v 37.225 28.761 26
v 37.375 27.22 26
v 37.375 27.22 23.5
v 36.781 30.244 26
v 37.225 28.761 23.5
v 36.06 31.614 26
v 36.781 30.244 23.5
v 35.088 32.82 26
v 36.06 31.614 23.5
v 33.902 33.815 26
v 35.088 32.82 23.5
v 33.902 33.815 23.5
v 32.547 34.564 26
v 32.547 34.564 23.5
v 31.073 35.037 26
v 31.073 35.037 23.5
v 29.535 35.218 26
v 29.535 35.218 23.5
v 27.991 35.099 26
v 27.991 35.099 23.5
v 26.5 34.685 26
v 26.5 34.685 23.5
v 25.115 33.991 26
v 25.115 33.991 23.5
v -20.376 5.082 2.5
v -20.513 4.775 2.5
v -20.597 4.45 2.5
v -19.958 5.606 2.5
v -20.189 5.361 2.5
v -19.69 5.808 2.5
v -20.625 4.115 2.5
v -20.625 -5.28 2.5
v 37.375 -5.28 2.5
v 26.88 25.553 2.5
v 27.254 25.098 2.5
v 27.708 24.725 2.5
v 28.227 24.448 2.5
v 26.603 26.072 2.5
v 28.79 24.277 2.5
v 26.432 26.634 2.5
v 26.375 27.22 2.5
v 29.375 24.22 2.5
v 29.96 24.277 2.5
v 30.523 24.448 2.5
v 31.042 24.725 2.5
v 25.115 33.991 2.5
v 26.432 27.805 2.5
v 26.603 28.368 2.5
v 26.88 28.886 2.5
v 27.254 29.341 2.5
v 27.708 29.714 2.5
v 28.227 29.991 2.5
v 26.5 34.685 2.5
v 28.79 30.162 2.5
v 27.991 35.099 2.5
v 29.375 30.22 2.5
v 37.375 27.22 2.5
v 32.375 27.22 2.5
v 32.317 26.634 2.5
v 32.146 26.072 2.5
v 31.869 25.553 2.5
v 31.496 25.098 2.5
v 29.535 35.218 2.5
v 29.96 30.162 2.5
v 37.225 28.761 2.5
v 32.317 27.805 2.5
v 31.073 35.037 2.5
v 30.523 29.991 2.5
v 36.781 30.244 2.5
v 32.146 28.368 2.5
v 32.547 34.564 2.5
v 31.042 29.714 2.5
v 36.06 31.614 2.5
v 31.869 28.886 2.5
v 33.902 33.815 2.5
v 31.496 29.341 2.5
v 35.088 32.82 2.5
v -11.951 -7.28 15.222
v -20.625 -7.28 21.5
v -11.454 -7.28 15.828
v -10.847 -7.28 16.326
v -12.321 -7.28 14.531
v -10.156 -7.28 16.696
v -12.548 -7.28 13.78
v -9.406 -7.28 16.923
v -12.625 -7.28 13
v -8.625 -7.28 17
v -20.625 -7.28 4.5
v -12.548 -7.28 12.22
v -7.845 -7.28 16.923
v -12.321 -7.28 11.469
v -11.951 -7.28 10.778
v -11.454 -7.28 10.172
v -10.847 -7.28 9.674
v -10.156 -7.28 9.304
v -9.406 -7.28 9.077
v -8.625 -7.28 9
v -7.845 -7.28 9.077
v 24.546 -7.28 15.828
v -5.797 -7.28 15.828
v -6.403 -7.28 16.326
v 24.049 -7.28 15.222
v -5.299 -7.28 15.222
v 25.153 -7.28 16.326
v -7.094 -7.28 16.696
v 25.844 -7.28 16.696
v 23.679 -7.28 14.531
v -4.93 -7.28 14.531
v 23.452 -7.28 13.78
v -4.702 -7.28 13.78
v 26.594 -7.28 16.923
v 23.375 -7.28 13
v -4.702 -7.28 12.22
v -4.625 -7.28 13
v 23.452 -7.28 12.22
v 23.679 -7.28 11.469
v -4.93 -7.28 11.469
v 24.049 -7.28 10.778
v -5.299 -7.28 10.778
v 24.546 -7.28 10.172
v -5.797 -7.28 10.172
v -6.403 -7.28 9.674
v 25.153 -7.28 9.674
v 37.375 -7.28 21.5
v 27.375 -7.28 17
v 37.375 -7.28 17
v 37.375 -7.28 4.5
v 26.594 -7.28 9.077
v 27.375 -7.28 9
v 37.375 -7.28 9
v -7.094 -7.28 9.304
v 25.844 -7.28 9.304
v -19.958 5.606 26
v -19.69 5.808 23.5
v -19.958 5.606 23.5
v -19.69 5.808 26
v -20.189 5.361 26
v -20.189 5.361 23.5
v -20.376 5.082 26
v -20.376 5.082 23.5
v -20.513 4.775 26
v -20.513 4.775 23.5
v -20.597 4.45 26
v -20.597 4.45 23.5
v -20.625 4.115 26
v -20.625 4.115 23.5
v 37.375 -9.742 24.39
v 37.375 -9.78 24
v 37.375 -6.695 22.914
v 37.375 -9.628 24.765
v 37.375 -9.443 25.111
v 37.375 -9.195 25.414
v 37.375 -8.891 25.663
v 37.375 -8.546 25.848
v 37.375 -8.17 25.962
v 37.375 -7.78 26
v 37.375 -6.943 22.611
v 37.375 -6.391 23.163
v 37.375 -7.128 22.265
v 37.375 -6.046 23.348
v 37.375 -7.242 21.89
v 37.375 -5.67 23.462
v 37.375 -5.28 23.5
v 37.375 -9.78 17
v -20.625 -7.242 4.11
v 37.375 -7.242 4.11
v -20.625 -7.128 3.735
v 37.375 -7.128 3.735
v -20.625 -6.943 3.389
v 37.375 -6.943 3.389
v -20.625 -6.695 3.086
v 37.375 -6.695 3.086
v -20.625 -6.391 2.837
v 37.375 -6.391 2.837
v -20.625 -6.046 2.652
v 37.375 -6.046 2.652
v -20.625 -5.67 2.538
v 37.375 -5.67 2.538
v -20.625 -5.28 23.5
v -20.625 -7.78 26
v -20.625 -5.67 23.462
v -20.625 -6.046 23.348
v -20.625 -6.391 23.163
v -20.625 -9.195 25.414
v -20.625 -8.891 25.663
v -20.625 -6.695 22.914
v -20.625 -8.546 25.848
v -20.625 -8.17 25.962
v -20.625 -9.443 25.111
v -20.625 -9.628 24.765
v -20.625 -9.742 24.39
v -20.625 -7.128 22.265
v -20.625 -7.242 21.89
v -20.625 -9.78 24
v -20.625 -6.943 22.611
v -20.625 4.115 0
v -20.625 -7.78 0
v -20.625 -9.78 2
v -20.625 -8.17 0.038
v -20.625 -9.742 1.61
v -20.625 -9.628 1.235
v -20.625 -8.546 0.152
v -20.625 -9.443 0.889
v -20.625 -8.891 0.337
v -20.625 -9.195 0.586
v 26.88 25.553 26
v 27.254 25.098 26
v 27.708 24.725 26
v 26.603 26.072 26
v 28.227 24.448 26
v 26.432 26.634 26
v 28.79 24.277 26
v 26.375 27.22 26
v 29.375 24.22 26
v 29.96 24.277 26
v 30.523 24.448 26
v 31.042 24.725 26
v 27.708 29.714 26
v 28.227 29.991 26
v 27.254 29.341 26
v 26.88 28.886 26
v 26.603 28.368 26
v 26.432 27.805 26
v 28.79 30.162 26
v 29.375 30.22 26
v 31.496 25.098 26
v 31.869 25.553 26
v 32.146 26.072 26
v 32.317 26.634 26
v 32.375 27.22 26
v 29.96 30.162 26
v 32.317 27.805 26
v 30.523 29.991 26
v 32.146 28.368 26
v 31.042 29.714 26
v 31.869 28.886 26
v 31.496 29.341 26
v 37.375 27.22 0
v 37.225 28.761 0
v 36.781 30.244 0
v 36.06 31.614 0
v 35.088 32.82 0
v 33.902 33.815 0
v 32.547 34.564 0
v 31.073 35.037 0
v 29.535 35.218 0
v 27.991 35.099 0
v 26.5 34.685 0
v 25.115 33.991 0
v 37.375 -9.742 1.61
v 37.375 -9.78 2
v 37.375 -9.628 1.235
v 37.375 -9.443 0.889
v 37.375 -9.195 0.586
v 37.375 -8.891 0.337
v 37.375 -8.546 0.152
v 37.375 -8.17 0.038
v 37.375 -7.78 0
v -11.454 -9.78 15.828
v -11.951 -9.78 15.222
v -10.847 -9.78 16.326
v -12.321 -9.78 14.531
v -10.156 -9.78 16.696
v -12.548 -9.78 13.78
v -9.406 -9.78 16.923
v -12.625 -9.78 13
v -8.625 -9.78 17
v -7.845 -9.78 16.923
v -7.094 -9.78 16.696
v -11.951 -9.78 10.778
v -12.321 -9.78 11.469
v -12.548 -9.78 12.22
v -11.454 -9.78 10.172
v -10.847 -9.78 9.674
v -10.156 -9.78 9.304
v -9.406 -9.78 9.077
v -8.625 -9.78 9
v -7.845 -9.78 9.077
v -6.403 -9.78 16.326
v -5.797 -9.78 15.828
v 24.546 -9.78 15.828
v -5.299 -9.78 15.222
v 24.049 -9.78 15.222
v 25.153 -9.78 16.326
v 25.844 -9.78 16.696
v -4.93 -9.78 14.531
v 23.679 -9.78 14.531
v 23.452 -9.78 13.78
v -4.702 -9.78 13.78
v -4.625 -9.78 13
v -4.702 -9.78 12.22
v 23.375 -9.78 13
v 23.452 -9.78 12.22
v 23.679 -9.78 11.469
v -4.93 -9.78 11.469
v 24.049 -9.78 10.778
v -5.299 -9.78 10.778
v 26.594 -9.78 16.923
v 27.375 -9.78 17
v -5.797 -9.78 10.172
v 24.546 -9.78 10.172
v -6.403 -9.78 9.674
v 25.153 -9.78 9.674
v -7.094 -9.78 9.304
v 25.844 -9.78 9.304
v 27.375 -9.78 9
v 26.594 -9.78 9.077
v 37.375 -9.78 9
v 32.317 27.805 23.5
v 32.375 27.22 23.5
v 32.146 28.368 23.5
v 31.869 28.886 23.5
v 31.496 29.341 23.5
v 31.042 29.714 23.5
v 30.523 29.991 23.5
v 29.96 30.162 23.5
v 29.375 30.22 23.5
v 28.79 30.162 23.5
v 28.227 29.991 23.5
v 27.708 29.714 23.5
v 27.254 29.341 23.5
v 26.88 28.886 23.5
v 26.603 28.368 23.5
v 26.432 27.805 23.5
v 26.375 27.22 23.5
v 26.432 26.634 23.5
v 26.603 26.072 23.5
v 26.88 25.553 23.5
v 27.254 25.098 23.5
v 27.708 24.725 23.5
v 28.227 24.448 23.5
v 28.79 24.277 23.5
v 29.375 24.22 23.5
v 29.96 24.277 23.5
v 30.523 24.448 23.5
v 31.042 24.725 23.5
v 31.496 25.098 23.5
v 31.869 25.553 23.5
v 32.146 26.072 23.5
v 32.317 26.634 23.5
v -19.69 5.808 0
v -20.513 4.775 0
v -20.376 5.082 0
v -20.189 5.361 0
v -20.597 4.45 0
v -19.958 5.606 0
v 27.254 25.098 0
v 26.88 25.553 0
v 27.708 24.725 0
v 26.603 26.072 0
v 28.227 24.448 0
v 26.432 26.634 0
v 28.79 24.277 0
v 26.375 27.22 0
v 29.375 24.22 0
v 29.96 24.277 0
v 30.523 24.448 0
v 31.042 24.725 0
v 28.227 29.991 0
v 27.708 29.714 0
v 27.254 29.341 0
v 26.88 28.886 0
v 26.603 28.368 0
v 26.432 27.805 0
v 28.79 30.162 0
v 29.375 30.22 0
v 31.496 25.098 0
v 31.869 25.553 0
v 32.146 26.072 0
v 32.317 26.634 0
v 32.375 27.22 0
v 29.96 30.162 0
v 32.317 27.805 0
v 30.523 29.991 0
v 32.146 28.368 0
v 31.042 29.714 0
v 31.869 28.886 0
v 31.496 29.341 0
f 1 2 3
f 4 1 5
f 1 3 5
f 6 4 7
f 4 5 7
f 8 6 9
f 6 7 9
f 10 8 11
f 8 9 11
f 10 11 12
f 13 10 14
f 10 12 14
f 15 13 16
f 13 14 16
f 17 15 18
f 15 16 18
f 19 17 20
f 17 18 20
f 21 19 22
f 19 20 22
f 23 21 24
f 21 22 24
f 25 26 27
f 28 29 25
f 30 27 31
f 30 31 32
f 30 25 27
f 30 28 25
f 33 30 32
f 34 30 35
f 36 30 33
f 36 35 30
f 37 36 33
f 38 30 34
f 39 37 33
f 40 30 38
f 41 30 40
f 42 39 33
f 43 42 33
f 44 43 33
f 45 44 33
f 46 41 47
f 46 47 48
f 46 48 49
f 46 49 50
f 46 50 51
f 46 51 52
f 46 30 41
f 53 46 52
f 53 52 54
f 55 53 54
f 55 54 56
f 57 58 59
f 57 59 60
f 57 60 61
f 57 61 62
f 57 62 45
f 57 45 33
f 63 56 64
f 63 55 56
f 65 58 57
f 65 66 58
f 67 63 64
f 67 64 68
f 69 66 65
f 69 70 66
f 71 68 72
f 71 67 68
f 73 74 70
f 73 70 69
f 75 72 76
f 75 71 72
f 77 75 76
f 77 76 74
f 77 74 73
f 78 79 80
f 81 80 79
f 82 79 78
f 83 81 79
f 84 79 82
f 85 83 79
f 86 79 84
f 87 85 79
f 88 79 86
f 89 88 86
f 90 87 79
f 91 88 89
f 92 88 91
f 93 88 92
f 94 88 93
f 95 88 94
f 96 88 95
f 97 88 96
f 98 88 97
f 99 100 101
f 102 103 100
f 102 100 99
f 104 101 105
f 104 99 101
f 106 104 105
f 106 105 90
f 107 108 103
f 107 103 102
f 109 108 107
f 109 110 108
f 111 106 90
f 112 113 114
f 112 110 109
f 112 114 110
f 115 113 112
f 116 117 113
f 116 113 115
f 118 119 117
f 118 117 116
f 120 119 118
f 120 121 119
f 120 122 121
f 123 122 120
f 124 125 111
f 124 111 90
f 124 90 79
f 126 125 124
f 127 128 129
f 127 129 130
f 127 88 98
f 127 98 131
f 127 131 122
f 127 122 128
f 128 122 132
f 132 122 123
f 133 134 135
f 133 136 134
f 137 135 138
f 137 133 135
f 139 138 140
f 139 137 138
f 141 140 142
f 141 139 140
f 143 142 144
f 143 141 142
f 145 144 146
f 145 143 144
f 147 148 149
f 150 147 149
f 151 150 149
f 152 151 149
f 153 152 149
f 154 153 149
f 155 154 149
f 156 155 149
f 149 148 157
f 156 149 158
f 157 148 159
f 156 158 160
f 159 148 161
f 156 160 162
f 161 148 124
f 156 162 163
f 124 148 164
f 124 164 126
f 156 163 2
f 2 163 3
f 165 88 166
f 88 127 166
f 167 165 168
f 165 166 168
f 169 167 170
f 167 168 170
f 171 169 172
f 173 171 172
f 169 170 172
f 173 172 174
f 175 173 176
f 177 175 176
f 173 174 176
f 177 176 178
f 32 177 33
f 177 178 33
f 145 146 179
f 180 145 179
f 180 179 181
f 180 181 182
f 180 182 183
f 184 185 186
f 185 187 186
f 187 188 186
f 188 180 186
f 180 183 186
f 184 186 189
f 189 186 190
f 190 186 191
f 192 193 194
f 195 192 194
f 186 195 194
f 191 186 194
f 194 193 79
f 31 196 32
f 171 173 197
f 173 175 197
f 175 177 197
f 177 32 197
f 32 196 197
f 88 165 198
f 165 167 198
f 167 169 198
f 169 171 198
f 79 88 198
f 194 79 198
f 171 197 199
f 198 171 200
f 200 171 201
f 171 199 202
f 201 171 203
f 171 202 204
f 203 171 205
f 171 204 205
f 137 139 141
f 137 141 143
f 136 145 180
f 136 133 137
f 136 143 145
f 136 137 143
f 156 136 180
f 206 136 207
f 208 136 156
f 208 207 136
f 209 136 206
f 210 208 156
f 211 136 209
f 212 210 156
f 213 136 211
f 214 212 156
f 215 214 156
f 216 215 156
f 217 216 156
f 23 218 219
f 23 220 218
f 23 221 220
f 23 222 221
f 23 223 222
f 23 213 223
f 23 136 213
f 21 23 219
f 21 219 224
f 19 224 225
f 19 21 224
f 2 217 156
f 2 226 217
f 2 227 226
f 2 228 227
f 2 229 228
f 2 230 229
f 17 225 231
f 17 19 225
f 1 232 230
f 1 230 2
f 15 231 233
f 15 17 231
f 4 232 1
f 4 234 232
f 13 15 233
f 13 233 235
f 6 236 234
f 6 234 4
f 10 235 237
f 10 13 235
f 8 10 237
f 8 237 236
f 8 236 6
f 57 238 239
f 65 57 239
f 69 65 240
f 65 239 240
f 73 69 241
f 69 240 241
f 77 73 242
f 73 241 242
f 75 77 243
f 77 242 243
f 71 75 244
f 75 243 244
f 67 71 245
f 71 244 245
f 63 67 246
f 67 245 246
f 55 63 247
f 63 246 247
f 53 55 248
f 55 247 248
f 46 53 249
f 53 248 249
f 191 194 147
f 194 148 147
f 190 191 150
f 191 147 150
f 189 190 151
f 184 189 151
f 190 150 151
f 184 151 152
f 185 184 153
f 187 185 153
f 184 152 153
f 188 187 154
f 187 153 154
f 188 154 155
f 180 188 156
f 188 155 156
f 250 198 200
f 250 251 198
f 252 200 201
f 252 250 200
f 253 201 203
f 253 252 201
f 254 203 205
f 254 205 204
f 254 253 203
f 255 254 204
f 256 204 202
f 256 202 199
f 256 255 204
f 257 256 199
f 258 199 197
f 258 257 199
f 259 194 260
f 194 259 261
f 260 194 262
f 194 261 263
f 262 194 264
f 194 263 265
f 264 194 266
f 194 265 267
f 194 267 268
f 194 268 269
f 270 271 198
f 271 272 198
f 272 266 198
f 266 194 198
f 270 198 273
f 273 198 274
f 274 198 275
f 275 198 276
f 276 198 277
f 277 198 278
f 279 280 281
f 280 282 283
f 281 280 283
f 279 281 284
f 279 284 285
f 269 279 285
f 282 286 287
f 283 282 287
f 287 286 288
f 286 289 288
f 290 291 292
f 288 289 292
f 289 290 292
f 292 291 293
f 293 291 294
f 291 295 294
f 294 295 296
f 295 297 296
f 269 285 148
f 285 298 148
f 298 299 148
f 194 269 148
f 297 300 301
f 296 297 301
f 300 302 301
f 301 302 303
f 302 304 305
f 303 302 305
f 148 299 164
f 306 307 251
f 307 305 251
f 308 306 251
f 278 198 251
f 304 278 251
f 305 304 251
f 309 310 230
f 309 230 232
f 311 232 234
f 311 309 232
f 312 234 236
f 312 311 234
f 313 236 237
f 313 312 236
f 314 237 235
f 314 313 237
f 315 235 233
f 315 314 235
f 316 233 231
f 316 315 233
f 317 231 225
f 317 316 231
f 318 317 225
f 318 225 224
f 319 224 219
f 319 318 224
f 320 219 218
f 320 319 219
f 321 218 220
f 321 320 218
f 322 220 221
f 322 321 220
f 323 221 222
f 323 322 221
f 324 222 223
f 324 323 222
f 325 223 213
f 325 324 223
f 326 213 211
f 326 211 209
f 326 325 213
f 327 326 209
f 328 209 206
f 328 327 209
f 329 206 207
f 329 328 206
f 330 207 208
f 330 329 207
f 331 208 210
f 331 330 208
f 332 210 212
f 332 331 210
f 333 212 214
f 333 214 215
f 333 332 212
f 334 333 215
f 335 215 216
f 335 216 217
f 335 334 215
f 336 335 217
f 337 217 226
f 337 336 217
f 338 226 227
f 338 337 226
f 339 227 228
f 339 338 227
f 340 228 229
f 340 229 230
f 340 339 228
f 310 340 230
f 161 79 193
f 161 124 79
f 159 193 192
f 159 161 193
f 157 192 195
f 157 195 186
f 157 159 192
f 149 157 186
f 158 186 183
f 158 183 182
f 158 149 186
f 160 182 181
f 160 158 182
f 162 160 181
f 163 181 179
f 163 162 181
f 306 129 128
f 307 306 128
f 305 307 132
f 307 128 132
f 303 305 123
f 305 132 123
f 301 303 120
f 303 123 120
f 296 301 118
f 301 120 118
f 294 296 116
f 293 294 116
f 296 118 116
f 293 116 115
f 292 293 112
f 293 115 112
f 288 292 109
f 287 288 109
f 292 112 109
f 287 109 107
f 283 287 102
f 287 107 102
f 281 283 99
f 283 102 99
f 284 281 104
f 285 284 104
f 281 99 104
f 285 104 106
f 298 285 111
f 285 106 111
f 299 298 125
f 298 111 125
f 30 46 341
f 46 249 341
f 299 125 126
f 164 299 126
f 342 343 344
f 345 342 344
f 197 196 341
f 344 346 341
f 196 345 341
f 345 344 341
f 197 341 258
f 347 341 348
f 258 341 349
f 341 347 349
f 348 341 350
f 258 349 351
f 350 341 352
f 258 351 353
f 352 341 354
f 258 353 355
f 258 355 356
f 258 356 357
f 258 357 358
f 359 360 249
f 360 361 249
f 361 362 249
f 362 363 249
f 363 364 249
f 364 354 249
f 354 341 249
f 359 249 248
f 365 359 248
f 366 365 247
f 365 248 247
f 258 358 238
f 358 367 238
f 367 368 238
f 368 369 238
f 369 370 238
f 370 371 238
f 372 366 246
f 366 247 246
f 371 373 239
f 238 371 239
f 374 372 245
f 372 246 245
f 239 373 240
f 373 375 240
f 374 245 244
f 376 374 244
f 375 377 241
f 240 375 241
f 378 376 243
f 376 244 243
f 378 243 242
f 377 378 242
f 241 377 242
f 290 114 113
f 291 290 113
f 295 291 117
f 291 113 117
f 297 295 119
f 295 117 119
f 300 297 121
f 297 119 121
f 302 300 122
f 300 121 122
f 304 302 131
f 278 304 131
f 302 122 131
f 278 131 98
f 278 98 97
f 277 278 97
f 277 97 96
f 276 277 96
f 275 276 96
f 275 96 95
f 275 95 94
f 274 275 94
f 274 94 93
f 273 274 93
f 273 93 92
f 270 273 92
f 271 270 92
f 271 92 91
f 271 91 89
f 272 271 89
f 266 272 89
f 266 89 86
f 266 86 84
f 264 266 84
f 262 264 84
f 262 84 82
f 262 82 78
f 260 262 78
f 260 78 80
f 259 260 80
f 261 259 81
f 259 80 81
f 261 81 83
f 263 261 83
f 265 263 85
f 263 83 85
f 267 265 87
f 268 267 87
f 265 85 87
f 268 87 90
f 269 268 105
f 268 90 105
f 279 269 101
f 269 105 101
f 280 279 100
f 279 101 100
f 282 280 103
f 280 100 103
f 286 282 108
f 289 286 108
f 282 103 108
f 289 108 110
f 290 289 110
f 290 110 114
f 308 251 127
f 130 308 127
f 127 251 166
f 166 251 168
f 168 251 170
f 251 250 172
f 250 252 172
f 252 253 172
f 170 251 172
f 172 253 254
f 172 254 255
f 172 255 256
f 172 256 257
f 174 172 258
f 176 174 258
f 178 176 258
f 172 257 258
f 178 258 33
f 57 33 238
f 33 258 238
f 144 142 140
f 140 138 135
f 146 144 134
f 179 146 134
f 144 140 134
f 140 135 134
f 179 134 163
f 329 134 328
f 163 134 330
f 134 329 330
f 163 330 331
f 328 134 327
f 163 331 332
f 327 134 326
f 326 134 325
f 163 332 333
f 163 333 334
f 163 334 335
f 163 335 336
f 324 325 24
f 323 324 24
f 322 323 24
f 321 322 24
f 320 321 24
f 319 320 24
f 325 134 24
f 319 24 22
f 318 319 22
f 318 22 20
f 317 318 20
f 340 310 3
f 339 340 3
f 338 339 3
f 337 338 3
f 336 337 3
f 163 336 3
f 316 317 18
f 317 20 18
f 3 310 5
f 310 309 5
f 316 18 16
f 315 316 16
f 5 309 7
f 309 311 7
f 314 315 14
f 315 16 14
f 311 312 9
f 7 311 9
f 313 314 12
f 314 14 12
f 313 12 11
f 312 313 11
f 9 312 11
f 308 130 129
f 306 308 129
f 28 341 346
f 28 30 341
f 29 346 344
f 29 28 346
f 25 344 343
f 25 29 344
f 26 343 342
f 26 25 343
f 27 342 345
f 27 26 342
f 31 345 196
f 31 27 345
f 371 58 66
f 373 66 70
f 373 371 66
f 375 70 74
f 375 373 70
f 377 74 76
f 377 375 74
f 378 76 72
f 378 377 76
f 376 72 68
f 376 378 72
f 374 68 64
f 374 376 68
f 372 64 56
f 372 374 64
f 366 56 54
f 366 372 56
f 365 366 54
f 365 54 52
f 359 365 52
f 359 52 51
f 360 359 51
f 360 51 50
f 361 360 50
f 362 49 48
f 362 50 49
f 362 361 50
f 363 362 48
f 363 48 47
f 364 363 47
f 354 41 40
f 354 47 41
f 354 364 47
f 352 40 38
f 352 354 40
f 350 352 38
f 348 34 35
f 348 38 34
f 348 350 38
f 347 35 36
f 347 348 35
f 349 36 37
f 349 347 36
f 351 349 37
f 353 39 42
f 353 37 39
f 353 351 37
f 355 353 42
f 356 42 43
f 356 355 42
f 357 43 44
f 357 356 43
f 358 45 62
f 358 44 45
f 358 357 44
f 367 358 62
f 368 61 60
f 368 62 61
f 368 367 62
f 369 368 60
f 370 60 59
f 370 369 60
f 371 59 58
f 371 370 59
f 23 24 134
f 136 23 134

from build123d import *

# Parameters (mm, degrees)
SKETCH1_R           = 3
BOSS_EXTRUDE1_DEPTH = 26
SHELL1_T            = -2.5
FILLET1_R           = 2
SKETCH2_R           = 4
CUT_EXTRUDE1_DEPTH  = 10.780316569
CUT_EXTRUDE2_DEPTH  = 10.780316569


with BuildPart() as part:
    # Sketch1 → Boss-Extrude1 (new body)
    with BuildSketch(Plane.XY):
        with BuildLine():
            Line((-20.625157389, -9.780316569), (37.374842611, -9.780316569))
            Line((37.374842611, -9.780316569), (37.374842611, 27.219683431))
            ThreePointArc((37.374842611, 27.219683431), (33.242887907, 34.222413298), (25.115286215, 33.991402512))
            Line((25.115286215, 33.991402512), (-20.625157389, 5.219683431))
            Line((-20.625157389, 5.219683431), (-20.625157389, -9.780316569))
        make_face()
        with Locations((29.374842611, 27.219683431)):
            Circle(SKETCH1_R, mode=Mode.SUBTRACT)
    extrude(amount=BOSS_EXTRUDE1_DEPTH)

    # Shell1
    shell1_openings = [part.faces().sort_by_distance(p)[0] for p in [
        (2.245064413, 19.605542972, 13),
        (32.24397616, 32.413978135, 13),
        (37.374842611, 8.719683431, 13),
        (-20.625157389, -2.280316569, 13),
        (32.374842611, 27.219683431, 26),
    ]]
    offset(amount=SHELL1_T, openings=shell1_openings, kind=Kind.INTERSECTION)

    # Fillet1
    fillet1_edges = [part.edges().sort_by_distance(p)[0] for p in [
        (-20.625157389, 5.219683431, 1.25),
        (8.374842611, -7.280316569, 23.5),
        (8.374842611, -7.280316569, 2.5),
        (8.374842611, -9.780316569, 0),
        (8.374842611, -9.780316569, 26),
        (-20.625157389, 5.219683431, 24.75),
    ]]
    fillet(fillet1_edges, radius=FILLET1_R)

    # Sketch2 → Cut-Extrude1 (cut, through all)
    with BuildSketch(Plane(origin=(0, 0, 0), x_dir=(1, 0, 0), z_dir=(0, 1, 0))):
        with Locations((-8.625157389, -13)):
            Circle(SKETCH2_R)
    extrude(amount=-CUT_EXTRUDE1_DEPTH, mode=Mode.SUBTRACT)

    # Sketch3 → Cut-Extrude2 (cut, through all)
    with BuildSketch(Plane(origin=(0, 0, 0), x_dir=(1, 0, 0), z_dir=(0, 1, 0))):
        with BuildLine():
            Line((37.374842611, -9), (27.374842611, -9))
            ThreePointArc((27.374842611, -9), (23.374842611, -13), (27.374842611, -17))
            Line((27.374842611, -17), (37.374842611, -17))
            Line((37.374842611, -17), (37.374842611, -9))
        make_face()
    extrude(amount=-CUT_EXTRUDE2_DEPTH, mode=Mode.SUBTRACT)


solid = part.part
